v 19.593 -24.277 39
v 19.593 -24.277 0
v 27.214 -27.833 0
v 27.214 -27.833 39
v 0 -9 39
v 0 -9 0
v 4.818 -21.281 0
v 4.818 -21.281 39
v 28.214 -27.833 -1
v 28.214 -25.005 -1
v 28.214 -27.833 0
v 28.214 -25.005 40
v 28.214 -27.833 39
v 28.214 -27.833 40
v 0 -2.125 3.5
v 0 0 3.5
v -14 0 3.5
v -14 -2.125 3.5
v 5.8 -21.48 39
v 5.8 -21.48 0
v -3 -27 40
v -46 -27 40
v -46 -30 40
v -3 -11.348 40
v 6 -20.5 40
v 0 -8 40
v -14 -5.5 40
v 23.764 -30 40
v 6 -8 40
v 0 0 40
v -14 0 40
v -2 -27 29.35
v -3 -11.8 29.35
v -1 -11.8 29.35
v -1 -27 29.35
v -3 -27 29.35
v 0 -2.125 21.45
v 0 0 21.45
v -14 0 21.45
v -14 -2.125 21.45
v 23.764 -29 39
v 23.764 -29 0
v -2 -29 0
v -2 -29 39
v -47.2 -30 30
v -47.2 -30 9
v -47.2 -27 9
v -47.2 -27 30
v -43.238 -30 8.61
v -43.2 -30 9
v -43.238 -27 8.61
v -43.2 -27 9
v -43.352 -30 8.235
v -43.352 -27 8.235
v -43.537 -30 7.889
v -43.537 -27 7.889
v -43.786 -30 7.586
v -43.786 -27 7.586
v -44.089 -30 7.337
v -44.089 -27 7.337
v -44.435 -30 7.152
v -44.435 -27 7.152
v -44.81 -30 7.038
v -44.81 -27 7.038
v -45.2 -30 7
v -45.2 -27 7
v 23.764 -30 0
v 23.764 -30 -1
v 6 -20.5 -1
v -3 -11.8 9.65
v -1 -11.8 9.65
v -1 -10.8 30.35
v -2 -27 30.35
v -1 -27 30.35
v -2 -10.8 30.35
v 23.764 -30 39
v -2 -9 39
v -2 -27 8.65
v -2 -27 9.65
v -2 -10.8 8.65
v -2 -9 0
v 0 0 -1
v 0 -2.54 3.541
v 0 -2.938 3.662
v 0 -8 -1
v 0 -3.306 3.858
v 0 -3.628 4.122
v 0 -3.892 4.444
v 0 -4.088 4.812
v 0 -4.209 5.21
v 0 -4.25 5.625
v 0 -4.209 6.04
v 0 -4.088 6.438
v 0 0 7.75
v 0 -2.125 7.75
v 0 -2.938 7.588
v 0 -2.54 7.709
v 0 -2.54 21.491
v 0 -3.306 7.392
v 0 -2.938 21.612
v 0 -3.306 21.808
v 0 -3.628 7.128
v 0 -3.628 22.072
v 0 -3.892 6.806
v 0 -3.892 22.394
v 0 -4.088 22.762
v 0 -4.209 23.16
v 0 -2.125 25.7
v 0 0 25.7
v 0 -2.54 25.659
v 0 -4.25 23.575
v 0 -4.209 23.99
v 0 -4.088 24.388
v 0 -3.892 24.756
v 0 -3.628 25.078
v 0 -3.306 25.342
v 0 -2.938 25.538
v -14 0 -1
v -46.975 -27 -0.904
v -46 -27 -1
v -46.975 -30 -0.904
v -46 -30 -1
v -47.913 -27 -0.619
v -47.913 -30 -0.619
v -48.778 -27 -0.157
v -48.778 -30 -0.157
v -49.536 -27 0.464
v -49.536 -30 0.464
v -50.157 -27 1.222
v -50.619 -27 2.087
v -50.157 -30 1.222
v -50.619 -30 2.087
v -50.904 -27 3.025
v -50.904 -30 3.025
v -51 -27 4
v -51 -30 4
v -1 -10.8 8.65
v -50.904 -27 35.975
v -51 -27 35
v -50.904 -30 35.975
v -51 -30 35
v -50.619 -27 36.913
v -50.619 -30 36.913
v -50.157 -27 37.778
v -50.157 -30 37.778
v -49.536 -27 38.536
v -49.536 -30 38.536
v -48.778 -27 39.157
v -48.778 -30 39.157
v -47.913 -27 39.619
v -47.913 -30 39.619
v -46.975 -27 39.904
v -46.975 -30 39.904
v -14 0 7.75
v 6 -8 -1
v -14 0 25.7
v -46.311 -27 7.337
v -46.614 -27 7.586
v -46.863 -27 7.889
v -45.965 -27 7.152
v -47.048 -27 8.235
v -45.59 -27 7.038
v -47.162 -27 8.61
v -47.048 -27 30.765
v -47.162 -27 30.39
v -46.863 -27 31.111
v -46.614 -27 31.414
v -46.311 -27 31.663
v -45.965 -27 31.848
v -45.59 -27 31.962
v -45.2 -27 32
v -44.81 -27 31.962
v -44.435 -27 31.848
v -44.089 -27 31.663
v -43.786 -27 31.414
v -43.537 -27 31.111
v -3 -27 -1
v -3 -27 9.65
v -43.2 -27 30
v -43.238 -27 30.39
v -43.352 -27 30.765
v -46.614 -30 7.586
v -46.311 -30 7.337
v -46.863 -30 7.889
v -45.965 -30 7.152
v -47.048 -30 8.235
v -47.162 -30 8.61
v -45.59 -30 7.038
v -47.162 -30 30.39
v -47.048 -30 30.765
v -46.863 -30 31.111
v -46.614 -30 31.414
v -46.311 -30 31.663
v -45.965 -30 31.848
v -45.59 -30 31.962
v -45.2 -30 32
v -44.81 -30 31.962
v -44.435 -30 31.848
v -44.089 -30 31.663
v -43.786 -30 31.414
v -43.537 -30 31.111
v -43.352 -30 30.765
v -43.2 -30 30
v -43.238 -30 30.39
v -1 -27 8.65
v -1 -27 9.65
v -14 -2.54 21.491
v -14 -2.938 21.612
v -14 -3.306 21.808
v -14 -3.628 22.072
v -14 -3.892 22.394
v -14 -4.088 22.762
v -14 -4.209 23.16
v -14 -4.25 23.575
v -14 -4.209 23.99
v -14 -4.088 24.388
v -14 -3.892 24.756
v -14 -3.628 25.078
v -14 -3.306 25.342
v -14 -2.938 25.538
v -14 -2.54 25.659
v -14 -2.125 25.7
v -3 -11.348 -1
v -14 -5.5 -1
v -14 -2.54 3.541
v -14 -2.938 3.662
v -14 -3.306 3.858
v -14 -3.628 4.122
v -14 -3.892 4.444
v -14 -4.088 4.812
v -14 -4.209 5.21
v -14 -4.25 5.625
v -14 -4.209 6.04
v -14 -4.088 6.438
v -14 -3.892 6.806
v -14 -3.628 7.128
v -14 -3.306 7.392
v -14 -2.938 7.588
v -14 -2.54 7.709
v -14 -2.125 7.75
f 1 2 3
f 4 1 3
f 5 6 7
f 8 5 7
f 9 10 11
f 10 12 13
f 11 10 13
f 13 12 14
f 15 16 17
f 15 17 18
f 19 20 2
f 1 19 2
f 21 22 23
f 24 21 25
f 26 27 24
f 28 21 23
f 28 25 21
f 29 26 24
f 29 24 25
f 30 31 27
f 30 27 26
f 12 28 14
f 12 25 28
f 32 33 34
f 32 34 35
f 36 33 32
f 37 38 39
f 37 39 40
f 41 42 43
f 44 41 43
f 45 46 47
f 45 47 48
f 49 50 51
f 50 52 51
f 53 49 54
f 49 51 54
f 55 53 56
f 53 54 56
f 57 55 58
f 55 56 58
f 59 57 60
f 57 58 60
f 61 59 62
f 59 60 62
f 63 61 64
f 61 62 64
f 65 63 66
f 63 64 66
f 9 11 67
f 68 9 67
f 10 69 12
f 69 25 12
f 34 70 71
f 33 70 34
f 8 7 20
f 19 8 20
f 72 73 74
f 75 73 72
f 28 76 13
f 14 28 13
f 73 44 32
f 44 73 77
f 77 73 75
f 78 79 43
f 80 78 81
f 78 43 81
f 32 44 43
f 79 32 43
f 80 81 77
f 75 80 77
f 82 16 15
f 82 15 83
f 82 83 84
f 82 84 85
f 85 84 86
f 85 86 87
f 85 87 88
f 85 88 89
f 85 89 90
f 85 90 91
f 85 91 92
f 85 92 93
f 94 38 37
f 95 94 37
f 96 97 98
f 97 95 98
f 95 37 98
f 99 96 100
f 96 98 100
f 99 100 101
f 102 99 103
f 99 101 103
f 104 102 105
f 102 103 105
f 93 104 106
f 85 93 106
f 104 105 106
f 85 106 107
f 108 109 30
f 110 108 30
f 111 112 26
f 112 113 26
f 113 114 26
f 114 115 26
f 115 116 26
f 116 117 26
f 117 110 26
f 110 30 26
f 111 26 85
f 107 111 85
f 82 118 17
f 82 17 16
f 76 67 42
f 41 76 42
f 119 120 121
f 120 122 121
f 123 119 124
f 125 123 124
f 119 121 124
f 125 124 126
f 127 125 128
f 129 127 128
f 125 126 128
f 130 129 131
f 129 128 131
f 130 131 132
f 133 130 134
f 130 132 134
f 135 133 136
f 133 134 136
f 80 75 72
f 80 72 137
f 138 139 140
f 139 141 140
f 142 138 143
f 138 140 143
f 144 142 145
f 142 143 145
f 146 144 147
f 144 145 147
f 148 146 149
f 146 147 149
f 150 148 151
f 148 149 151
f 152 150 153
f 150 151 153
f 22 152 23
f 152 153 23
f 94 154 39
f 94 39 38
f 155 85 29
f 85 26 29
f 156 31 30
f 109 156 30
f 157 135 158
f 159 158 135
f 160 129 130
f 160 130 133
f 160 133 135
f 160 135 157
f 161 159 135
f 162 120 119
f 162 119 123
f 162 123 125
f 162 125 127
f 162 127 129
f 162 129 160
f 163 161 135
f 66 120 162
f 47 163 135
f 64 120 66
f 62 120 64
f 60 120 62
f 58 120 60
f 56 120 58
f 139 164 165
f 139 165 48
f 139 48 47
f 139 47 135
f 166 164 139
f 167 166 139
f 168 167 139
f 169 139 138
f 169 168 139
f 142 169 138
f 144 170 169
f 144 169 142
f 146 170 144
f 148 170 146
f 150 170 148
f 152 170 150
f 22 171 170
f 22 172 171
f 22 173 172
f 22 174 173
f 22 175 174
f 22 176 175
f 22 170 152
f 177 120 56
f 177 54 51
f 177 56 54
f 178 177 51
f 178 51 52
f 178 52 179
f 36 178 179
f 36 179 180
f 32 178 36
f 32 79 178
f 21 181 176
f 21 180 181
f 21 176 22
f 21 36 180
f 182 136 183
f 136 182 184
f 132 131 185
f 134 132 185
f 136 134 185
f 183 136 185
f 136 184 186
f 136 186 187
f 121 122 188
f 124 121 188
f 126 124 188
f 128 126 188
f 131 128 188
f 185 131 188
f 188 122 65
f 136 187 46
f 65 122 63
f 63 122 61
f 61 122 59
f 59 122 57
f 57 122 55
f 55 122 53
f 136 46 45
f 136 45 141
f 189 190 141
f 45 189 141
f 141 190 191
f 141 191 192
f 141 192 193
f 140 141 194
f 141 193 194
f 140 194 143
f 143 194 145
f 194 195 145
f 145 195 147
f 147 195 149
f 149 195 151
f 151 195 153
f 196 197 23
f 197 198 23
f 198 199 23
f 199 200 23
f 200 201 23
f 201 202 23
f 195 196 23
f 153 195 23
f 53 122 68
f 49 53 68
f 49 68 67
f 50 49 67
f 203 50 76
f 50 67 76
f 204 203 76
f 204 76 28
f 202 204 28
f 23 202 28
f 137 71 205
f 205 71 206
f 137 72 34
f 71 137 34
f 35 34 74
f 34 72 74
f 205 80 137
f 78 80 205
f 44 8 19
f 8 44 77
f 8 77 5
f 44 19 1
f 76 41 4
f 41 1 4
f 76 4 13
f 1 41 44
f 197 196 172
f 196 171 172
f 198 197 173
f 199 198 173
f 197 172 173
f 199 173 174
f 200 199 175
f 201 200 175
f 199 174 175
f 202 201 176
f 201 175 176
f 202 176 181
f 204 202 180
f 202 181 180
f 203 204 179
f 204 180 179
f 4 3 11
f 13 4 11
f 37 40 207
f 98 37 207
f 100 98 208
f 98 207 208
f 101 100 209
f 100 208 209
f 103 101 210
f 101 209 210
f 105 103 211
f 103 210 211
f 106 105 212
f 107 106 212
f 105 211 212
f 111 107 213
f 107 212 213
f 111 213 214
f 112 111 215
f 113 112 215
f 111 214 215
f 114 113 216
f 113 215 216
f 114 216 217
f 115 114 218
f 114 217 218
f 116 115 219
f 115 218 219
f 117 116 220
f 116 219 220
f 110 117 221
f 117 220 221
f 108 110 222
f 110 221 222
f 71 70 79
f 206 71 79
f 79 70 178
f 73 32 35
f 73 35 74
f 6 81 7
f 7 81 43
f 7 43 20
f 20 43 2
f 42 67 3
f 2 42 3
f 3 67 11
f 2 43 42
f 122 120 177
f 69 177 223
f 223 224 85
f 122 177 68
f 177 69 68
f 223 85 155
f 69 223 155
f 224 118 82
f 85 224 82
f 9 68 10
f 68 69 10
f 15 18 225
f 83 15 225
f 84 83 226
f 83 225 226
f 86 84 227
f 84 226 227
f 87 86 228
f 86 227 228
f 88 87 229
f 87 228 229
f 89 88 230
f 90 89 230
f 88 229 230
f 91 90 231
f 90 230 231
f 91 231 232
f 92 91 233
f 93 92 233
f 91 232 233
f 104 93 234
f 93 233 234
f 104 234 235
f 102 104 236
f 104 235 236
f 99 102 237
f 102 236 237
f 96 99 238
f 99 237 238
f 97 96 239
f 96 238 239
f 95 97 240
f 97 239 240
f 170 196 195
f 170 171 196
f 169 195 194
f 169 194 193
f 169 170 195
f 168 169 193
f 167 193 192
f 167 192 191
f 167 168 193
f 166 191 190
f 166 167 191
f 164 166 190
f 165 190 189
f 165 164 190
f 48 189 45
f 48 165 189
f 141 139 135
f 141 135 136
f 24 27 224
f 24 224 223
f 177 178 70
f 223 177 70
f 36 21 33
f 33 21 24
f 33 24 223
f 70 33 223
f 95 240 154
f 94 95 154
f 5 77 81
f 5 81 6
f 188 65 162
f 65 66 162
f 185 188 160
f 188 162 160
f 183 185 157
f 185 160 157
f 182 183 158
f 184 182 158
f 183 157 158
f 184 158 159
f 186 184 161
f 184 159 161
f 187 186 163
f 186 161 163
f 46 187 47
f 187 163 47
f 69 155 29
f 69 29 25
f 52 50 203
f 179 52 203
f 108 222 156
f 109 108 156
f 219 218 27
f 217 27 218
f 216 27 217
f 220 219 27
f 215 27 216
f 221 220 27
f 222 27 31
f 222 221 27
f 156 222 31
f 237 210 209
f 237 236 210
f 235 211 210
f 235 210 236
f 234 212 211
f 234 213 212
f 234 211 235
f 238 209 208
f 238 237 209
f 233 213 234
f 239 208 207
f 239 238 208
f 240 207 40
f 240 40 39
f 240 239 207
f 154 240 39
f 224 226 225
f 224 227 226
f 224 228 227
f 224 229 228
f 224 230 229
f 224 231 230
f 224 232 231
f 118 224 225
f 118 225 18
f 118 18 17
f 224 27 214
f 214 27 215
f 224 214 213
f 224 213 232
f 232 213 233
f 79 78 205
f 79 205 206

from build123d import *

# Parameters (mm, degrees)
F1_DEPTH  = 39
F3_DEPTH  = 1
F5_DEPTH  = 1
F6_W      = 3
F6_H      = 41
F7_DEPTH  = 48
F8_W      = 4
F8_H      = 25
F9_DEPTH  = 30.001
F10_R     = 1.99999
F11_R     = 5
F12_W     = 15.2
F12_H     = 19.7
F13_DEPTH = 3
F15_DEPTH = 2
F17_DEPTH = 41
F19_DEPTH = 25
F21_DEPTH = 41


# Not quite as in the source:
# - a fillet or chamfer is up to 0.001 mm smaller than in the source, because OpenCascade refuses the exact size
# - ends of sketch curves that miss each other by under 0.0002 mm in the source are joined


with BuildPart() as f1:
    # F0 (on Top) → F1 (new body)
    with BuildSketch(Plane.XY):
        Polygon((0, -8), (0, 0), (-3, 0), (-3, -30), (23.763641715, -30), (23.763641715, -29), (-2, -29), (-2, -9), (0, -9), (4.8176753794, -21.2806219141), (5.7998719041, -21.4797707681), (19.5929166818, -24.2767604715), (27.2138139009, -27.8326366097), (28.2138139009, -27.8326366097), (28.2138139009, -25.9040332723), (28.2138139009, -25.0045752954), (6, -20.5), (6, -8), align=None)
    extrude(amount=F1_DEPTH)

    # F2 (on face) → F3 (join)
    with BuildSketch(Plane.XY.offset(39)):
        Polygon((0, 0), (-3, 0), (-3, -30), (23.763641715, -30), (28.2138139009, -27.8326366097), (28.2138139009, -25.0045752954), (6, -20.5), (6, -8), (0, -8), align=None)
    extrude(amount=F3_DEPTH)

    # F4 (on face) → F5 (join)
    with BuildSketch(Plane(origin=(0, 0, 0), x_dir=(1, 0, 0), z_dir=(0, 0, -1))):
        Polygon((-3, 0), (0, 0), (0, 8), (6, 8), (6, 20.5), (28.2138139009, 25.0045752954), (28.2138139009, 27.8326366097), (23.763641715, 30), (-3, 30), align=None)
    extrude(amount=F5_DEPTH)

    # F6 (on face) → F7 (join)
    with BuildSketch(Plane(origin=(-3, 0, 0), x_dir=(0, -1, 0), z_dir=(-1, 0, 0))):
        with Locations((28.5, 19.5)):
            Rectangle(F6_W, F6_H)
    extrude(amount=F7_DEPTH)

    # F8 (on face) → F9 (cut, through all)
    with BuildSketch(Plane.XZ.offset(30)):
        with Locations((-45.2, 19.5)):
            Rectangle(F8_W, F8_H)
    extrude(amount=-F9_DEPTH, mode=Mode.SUBTRACT)

    # F10 (radius 2 in the source; OpenCascade refuses exactly that, so slightly less here)
    f10_edges = [f1.edges().sort_by_distance(p)[0] for p in [
        (-47.2, -28.5, 32),
        (-43.2, -28.5, 32),
        (-47.2, -28.5, 7),
        (-43.2, -28.5, 7),
    ]]
    fillet(f10_edges, radius=F10_R)

    # F11
    f11_edges = [f1.edges().sort_by_distance(p)[0] for p in [
        (-51, -28.5, 40),
        (-51, -28.5, -1),
    ]]
    fillet(f11_edges, radius=F11_R)

    # F12 (on face) → F13 (cut)
    with BuildSketch(Plane(origin=(-3, 0, 0), x_dir=(0, -1, 0), z_dir=(-1, 0, 0))):
        with Locations((19.4, 19.5)):
            Rectangle(F12_W, F12_H)
    extrude(amount=-F13_DEPTH, mode=Mode.SUBTRACT)

    # F14 (on face) → F15 (join)
    with BuildSketch(Plane(origin=(-3, 0, 0), x_dir=(0, -1, 0), z_dir=(-1, 0, 0))):
        Polygon((10.8, 30.35), (10.8, 8.65), (27, 8.65), (27, 9.65), (11.8, 9.65), (11.8, 29.35), (27, 29.35), (27, 30.35), align=None)
    extrude(amount=-F15_DEPTH)

    # F16 (on face) → F17 (join, through all)
    with BuildSketch(Plane(origin=(0, 0, -1), x_dir=(1, 0, 0), z_dir=(0, 0, -1))):
        Polygon((-14, 0), (-3, 0), (-3, 8), (-14, 5.5), align=None)
    extrude(amount=-F17_DEPTH)

    # F18 (on face) → F19 (cut)
    with BuildSketch(Plane(origin=(-14, 0, 0), x_dir=(0, -1, 0), z_dir=(-1, 0, 0))):
        with BuildLine():
            Line((-0.9789119939, 3.5), (2.125, 3.5))
            ThreePointArc((2.125, 3.5), (4.25, 5.625), (2.125, 7.75))
            Line((2.125, 7.75), (-0.9789119939, 7.75))
            Line((-0.9789119939, 7.75), (-0.9789119939, 3.5))
        make_face()
        with BuildLine():
            Line((-0.98, 21.45), (2.125, 21.45))
            ThreePointArc((2.125, 21.45), (4.25, 23.575), (2.125, 25.7))
            Line((2.125, 25.7), (-0.98, 25.7))
            Line((-0.98, 25.7), (-0.98, 21.45))
        make_face()
    extrude(amount=-F19_DEPTH, mode=Mode.SUBTRACT)

    # F20 (on face) → F21 (join, through all)
    with BuildSketch(Plane.XY.offset(40)):
        Polygon((-3, -8), (-14, -5.5), (-3, -11.3482829183), align=None)
    extrude(amount=-F21_DEPTH)


solid = f1.part
